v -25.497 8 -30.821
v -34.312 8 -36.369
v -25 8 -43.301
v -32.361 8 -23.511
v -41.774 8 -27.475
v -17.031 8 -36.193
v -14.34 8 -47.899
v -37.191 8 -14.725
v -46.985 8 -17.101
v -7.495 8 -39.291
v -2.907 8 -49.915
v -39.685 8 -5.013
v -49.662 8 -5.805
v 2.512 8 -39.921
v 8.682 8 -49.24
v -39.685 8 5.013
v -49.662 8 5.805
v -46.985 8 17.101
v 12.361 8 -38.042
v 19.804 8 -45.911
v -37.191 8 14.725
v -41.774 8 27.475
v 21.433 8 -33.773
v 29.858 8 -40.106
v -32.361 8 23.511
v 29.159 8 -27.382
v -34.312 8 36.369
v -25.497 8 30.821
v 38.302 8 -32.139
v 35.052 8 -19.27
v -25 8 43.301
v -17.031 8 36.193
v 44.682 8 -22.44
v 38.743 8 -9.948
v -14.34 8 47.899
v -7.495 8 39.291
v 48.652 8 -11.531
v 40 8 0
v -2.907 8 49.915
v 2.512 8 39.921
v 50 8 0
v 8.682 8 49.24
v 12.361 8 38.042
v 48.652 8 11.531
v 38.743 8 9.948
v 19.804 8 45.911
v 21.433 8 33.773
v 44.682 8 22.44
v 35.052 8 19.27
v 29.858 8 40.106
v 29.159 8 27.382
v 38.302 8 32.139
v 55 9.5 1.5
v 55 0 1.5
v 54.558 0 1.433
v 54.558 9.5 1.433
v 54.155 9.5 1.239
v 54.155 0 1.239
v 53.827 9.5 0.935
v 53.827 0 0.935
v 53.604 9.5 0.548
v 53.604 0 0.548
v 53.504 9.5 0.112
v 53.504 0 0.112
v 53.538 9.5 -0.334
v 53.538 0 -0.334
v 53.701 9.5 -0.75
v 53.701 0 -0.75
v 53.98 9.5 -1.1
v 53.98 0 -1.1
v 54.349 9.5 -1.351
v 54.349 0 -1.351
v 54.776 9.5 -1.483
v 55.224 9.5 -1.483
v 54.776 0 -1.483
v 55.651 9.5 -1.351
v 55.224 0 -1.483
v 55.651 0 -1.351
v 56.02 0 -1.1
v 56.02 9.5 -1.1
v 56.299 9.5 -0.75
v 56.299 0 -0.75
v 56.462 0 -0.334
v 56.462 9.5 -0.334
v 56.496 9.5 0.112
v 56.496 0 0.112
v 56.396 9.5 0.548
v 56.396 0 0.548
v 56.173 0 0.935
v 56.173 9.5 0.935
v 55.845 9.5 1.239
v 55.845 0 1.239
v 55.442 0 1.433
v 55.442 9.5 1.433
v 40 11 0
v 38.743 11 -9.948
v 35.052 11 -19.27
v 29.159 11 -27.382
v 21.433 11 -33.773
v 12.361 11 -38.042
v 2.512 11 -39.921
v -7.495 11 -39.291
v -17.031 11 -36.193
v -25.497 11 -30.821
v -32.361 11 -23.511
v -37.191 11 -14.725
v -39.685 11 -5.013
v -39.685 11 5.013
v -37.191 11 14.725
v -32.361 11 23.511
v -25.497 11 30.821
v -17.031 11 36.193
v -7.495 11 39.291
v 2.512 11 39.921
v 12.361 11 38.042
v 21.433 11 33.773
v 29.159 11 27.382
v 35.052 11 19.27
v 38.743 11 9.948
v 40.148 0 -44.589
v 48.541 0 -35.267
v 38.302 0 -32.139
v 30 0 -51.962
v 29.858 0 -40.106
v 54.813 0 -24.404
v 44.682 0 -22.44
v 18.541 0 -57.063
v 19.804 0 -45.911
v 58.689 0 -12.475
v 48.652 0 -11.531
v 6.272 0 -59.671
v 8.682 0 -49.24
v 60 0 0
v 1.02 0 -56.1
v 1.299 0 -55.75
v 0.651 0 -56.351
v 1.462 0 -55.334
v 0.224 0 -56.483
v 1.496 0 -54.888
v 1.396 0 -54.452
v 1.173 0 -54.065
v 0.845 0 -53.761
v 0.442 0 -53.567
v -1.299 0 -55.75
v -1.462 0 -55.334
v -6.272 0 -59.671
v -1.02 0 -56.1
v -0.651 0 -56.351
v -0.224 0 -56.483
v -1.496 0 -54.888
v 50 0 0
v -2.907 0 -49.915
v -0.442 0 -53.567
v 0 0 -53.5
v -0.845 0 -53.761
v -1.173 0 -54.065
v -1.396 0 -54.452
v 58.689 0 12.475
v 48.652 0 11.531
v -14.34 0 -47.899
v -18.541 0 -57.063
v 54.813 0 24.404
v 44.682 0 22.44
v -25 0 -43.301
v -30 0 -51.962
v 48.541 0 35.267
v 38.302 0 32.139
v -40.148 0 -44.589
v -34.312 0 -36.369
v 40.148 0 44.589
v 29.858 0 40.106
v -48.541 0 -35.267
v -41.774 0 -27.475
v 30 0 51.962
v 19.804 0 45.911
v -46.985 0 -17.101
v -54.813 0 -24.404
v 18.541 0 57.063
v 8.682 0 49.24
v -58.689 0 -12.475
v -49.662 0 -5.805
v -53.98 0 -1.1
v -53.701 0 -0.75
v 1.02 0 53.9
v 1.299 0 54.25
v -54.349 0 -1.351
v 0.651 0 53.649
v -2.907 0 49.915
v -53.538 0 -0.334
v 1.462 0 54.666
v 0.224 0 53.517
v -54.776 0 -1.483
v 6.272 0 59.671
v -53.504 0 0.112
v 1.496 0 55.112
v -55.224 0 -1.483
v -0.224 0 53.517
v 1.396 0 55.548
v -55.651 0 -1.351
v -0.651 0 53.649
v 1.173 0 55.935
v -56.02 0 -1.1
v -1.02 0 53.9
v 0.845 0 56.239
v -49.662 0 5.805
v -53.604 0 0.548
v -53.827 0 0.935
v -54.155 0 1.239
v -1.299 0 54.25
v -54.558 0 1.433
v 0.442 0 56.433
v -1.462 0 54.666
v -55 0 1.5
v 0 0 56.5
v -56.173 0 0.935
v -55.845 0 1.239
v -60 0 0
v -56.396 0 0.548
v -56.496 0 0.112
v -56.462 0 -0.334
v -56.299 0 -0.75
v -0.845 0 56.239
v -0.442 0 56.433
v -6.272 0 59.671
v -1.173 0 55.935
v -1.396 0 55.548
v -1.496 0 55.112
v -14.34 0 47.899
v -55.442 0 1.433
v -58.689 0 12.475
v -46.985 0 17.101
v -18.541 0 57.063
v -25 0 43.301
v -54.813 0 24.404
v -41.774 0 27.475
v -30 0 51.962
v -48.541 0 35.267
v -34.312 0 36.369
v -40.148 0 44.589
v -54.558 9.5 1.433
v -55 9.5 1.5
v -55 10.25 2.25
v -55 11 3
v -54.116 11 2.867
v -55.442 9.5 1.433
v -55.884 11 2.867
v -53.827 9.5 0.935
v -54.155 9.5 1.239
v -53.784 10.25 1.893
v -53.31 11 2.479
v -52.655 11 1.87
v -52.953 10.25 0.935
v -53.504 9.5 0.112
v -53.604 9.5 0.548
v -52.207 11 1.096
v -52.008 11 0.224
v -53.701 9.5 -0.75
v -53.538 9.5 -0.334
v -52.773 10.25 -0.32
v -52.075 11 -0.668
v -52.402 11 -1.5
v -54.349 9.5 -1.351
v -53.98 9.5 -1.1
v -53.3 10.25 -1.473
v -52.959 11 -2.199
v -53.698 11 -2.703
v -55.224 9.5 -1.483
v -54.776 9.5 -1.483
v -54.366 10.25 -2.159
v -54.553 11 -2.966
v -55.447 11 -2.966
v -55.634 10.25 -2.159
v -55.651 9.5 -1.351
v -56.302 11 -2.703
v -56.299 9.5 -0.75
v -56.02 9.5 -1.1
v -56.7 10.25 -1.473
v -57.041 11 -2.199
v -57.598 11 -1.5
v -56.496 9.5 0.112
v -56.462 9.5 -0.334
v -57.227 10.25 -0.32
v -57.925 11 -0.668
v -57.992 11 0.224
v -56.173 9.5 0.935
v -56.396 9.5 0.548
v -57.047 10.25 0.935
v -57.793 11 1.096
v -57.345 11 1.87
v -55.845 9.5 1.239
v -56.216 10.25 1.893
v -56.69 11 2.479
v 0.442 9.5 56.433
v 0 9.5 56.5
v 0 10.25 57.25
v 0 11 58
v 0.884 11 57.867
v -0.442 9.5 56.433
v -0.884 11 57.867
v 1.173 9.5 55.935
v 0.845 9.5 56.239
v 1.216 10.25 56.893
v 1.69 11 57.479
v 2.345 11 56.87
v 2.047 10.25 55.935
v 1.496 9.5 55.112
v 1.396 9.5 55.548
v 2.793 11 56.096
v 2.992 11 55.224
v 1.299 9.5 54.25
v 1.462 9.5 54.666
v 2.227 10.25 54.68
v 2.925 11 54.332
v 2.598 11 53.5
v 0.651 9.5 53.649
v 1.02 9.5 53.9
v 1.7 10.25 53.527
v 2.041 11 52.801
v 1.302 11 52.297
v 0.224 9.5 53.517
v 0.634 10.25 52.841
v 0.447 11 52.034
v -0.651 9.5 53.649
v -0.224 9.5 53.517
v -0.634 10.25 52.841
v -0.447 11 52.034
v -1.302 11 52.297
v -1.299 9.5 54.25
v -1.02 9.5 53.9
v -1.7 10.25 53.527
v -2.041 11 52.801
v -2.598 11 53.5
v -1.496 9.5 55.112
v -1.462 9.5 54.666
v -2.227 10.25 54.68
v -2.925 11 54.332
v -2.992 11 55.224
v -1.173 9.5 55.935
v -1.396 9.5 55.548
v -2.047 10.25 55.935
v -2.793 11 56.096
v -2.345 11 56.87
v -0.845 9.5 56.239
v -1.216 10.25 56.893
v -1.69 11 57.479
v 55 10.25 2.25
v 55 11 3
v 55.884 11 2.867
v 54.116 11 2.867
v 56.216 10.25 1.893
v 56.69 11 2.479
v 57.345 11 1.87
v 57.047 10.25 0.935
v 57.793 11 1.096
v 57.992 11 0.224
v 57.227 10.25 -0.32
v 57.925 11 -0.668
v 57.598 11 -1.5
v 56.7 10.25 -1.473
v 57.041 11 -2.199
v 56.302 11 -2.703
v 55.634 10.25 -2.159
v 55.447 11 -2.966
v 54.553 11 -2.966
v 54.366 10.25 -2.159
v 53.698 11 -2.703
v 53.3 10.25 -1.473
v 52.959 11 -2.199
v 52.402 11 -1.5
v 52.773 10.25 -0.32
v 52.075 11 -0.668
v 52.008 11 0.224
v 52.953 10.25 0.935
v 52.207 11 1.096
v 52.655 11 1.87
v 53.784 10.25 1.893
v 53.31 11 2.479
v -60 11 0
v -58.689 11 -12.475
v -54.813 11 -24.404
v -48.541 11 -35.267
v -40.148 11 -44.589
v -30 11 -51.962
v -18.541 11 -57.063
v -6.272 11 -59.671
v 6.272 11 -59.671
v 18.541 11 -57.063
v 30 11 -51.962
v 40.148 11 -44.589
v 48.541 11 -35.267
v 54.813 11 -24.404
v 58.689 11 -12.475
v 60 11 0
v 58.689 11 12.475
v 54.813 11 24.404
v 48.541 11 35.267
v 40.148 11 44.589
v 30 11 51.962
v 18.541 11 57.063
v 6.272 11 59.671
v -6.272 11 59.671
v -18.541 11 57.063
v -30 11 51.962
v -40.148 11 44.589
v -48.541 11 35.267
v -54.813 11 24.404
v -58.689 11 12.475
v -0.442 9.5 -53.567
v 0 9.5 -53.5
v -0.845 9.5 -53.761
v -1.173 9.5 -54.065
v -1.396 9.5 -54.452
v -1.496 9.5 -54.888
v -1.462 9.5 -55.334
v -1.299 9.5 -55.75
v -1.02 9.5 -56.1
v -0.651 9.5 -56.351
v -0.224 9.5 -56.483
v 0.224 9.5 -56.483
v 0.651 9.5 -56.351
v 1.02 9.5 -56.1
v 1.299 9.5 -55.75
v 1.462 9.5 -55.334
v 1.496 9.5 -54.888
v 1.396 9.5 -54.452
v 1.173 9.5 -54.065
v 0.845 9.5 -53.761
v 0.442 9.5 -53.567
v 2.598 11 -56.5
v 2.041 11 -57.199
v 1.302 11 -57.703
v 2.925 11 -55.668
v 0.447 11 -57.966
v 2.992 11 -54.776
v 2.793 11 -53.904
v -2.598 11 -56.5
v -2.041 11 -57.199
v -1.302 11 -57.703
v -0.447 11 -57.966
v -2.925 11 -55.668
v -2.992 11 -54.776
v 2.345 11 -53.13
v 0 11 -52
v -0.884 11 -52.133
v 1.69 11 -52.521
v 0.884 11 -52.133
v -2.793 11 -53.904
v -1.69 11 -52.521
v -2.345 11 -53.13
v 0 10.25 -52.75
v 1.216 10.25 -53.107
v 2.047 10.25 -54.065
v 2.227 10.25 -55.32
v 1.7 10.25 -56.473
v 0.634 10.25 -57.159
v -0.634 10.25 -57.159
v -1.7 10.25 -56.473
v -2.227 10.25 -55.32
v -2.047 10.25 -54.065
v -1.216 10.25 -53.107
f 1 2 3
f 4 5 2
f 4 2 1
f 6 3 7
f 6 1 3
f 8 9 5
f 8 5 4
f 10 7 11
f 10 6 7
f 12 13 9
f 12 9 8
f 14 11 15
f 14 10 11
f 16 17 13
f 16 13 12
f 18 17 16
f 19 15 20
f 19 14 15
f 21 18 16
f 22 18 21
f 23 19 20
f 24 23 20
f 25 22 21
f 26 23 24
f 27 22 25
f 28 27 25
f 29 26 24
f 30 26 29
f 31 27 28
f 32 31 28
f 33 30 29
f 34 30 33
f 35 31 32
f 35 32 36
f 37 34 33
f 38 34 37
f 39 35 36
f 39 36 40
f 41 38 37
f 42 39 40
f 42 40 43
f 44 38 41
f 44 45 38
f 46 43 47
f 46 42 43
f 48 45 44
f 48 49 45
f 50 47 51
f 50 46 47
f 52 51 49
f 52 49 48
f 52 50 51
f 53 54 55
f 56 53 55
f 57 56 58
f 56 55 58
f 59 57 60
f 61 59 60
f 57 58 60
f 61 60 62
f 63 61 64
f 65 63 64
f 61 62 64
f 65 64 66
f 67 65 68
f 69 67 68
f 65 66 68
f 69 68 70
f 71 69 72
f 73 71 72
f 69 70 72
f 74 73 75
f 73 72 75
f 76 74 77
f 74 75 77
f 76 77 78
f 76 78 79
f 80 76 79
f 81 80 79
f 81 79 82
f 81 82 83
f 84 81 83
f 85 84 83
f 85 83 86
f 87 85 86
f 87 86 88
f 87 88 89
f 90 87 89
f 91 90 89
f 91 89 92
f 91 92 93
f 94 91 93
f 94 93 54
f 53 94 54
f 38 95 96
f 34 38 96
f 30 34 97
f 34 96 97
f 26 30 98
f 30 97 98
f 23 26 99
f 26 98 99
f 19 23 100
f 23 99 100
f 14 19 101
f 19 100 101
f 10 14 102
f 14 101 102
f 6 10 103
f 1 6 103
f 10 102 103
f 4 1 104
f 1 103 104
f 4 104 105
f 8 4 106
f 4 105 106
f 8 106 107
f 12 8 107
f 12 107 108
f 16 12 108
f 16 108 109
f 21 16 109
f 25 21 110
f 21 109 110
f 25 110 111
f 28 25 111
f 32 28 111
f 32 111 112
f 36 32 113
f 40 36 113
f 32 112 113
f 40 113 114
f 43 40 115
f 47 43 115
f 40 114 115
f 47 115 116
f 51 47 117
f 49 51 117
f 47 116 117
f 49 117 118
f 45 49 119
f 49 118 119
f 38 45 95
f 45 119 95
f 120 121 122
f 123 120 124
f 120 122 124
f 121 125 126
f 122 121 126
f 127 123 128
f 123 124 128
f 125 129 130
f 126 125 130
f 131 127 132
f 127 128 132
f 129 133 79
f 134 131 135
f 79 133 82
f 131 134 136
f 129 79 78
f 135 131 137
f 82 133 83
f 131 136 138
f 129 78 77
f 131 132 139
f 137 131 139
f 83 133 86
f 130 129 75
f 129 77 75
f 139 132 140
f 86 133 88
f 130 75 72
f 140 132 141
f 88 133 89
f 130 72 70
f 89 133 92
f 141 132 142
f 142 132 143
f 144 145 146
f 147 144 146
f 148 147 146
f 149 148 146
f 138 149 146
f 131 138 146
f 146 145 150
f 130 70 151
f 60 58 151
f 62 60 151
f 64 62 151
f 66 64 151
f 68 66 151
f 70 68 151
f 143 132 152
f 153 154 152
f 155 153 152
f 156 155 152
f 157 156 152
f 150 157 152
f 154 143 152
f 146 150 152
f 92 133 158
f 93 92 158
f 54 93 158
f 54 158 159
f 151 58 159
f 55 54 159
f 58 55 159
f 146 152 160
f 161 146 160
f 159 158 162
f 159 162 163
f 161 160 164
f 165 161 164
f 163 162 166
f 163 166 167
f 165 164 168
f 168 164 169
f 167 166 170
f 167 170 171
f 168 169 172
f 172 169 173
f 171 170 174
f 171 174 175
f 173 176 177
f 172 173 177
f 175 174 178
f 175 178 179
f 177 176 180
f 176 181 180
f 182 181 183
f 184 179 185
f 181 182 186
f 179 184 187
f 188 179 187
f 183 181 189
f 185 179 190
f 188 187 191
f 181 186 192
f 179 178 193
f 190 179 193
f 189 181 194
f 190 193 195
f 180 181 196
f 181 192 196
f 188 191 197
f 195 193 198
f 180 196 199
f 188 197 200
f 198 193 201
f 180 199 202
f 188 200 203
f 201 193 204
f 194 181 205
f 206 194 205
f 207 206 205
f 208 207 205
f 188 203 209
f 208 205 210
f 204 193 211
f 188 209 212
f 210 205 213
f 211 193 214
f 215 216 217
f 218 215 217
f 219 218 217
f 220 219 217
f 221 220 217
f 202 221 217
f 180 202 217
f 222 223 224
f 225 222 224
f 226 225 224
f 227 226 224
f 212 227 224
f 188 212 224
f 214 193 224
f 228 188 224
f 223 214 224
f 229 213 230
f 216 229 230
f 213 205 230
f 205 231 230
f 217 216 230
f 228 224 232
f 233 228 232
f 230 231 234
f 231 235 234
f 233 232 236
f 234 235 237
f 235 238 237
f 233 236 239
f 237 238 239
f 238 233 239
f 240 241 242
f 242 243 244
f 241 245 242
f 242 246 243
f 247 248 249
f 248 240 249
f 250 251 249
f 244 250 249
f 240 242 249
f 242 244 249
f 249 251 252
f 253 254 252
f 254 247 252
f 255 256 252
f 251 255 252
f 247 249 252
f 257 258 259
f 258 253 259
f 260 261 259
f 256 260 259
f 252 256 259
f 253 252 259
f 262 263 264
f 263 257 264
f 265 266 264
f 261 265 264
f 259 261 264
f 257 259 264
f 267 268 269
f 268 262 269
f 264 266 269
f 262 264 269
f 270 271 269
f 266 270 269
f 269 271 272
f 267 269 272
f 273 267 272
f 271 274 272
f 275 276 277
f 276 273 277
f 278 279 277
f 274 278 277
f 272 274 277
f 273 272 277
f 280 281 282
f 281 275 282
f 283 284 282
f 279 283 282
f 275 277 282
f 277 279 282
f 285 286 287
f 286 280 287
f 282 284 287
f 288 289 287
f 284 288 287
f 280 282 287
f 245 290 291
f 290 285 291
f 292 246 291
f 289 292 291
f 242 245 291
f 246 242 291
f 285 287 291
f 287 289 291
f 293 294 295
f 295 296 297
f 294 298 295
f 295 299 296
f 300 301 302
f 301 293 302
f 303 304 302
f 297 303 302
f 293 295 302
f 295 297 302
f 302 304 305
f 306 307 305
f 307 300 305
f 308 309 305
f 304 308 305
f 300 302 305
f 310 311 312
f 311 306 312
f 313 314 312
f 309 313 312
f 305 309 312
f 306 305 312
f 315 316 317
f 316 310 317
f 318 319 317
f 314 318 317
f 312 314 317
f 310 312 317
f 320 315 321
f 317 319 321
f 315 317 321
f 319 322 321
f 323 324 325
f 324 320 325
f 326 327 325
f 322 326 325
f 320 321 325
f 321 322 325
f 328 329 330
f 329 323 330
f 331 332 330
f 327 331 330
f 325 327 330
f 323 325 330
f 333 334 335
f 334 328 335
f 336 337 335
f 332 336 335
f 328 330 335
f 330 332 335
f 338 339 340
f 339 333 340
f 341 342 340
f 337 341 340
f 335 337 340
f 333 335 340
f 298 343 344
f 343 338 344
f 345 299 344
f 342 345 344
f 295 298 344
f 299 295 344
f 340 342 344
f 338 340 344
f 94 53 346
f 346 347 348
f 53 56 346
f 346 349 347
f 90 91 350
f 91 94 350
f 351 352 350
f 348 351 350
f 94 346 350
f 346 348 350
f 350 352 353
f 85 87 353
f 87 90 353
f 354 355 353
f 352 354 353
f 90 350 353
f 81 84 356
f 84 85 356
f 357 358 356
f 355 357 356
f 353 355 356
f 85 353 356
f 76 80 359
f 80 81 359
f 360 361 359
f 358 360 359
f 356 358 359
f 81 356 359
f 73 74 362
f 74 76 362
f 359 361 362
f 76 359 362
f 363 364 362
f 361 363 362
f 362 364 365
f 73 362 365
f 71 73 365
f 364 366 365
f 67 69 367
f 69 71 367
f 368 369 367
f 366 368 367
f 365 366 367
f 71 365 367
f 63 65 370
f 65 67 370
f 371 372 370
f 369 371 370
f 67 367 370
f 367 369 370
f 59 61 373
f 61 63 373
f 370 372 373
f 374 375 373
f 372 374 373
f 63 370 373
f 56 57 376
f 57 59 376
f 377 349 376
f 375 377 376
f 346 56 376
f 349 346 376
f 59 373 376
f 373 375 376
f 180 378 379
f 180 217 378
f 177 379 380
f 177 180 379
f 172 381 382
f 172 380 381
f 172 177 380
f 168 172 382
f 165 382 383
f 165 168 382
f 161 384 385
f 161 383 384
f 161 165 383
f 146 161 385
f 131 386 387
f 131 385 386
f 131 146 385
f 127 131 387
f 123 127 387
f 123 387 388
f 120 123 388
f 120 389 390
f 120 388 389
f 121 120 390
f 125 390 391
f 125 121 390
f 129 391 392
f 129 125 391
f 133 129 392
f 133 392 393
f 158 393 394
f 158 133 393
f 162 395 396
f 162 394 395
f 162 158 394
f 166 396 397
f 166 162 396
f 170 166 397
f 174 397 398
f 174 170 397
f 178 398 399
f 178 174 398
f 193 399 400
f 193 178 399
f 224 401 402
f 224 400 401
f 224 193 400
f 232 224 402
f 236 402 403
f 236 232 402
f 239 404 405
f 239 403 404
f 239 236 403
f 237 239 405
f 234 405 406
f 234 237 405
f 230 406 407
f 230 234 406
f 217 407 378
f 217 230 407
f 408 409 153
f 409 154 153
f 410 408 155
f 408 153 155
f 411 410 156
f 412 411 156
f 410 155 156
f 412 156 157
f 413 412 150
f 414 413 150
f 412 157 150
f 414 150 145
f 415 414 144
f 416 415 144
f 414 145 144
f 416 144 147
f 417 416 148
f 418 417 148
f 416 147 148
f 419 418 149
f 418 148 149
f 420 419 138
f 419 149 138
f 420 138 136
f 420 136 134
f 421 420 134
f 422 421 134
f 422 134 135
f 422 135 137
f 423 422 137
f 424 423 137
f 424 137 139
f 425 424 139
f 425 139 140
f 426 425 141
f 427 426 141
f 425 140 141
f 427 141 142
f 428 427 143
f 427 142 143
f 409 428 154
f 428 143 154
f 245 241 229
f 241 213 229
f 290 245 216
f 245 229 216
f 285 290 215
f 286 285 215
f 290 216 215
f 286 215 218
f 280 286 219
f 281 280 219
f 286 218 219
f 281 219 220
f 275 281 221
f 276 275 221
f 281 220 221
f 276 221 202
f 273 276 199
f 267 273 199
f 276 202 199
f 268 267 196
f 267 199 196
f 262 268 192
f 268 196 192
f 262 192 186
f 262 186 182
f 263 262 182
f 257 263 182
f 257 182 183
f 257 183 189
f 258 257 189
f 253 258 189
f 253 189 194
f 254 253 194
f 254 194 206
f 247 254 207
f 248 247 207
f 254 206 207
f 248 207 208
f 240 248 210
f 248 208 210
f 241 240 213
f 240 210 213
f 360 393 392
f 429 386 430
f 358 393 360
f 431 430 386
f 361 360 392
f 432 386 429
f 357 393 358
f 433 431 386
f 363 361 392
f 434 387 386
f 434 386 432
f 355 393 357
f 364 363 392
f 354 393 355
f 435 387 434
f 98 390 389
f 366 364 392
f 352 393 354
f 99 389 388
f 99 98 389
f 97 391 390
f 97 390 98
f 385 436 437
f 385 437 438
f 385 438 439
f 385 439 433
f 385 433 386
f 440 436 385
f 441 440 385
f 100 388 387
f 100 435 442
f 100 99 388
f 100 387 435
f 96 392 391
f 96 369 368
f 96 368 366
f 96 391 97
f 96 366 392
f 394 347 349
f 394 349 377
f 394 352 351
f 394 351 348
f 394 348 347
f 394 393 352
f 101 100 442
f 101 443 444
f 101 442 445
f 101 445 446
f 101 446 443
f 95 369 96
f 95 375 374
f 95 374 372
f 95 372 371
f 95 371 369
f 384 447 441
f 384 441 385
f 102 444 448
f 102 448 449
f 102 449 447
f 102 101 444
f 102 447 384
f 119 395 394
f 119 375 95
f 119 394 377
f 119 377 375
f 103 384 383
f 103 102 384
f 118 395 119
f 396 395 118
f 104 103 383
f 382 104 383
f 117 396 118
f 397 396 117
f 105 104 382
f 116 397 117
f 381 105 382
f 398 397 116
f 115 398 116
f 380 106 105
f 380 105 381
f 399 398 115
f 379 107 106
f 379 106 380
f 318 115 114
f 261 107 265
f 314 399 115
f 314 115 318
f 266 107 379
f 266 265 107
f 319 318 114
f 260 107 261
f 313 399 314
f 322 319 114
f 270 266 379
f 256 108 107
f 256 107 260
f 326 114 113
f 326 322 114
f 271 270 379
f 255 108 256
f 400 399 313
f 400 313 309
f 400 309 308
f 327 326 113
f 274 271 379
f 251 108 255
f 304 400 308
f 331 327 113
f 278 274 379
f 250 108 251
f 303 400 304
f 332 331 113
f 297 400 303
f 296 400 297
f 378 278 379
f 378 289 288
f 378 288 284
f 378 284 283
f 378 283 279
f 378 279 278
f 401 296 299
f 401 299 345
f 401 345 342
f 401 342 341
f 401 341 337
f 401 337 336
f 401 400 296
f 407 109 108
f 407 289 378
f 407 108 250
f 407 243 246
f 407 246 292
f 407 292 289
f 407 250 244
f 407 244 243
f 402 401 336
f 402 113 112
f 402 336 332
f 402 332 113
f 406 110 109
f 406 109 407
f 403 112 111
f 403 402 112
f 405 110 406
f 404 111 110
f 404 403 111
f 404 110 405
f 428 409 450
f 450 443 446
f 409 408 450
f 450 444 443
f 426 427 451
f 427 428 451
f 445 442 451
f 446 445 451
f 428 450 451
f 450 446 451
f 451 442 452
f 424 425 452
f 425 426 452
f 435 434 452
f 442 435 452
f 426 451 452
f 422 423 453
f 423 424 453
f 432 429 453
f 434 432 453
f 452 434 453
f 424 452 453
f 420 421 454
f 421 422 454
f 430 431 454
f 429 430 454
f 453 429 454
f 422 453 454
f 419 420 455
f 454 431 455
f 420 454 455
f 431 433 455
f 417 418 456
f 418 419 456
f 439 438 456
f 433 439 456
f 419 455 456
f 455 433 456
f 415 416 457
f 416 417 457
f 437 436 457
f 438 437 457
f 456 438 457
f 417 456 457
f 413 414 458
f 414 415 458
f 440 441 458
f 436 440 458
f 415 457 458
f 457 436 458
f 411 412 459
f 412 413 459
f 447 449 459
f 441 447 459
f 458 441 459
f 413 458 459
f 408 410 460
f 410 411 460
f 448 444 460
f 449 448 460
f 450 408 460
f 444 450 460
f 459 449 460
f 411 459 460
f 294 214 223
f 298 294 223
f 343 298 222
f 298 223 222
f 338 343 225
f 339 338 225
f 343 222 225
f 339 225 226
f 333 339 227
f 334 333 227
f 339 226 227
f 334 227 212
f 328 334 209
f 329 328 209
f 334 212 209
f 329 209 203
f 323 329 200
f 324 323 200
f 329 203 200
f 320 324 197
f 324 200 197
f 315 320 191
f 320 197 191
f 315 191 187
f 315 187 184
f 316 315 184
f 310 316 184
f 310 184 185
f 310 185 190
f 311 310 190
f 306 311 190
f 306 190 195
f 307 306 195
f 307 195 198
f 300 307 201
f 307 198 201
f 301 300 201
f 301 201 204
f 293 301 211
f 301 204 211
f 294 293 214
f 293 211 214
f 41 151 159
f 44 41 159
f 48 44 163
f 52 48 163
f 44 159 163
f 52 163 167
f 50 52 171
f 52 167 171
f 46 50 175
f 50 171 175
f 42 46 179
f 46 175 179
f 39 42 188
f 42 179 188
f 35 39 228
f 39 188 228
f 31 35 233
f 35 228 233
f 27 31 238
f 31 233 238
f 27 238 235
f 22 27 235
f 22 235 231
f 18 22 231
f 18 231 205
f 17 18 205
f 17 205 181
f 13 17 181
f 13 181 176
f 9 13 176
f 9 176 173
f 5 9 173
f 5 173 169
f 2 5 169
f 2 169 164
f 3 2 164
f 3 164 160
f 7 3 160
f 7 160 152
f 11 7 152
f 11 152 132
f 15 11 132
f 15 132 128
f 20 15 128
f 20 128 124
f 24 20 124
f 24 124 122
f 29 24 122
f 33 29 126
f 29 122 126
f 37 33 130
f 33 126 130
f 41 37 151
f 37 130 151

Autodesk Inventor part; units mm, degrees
ref_plane "YZ Plane" through (0, 0, 0) normal (1, 0, 0) x (0, 1, 0)
ref_plane "XZ Plane" through (0, 0, 0) normal (0, 1, 0) x (-1, 0, 0)
ref_plane "XY Plane" through (0, 0, 0) normal (0, 0, 1) x (1, 0, 0)
sketch "Sketch1" plane through (0, 0, 0) normal (0, 1, 0) x (-1, 0, 0)
  circle A0 centre (0, 0) radius 60
  dimension "d0" = 120
extrude "Extrusion1" add sketch "Sketch1" along normal blind 11
sketch "Sketch3" plane through (0, 11, 0) normal (0, 1, 0) x (1, 0, 0)
  circle A0 centre (0, 0) radius 40
  dimension "d6" = 80
extrude "Extrusion3" cut sketch "Sketch3" against normal through all
sketch "Sketch2" plane through (0, 0, 0) normal (0, -1, 0) x (1, 0, 0)
  circle A0 centre (0, 0) radius 50
  dimension "d3" = 100
extrude "Extrusion2" cut sketch "Sketch2" against normal blind 8
sketch "Sketch4" plane through (0, 11, 0) normal (0, 1, 0) x (1, 0, 0)
  circle A0 centre (0, 0) radius 55
  circle A1 centre (0, 55) radius 1.5
  circle A2 centre (-55, 0) radius 1.5
  circle A3 centre (0, -55) radius 1.5
  circle A4 centre (55, 0) radius 1.5
  dimension "d9" = 110
  dimension "d10" = 3
  dimension "d13" = 360
hole "Hole1" at (0, 11, -55) at (-55, 11, 0) at (0, 11, 55) at (55, 11, 0) direction (0, -1, 0) diameter 3 end through all countersink diameter 6 countersink angle 90
thread "Thread1" size "M3x0.5" class "6H" standard "ANSI Metric M Profile" full length
thread "Thread2" size "M3x0.5" class "6H" standard "ANSI Metric M Profile" full length
thread "Thread3" size "M3x0.5" class "6H" standard "ANSI Metric M Profile" full length
thread "Thread4" size "M3x0.5" class "6H" standard "ANSI Metric M Profile" full length
properties part number "sensor2_lock" material "Aluminum 6061"
